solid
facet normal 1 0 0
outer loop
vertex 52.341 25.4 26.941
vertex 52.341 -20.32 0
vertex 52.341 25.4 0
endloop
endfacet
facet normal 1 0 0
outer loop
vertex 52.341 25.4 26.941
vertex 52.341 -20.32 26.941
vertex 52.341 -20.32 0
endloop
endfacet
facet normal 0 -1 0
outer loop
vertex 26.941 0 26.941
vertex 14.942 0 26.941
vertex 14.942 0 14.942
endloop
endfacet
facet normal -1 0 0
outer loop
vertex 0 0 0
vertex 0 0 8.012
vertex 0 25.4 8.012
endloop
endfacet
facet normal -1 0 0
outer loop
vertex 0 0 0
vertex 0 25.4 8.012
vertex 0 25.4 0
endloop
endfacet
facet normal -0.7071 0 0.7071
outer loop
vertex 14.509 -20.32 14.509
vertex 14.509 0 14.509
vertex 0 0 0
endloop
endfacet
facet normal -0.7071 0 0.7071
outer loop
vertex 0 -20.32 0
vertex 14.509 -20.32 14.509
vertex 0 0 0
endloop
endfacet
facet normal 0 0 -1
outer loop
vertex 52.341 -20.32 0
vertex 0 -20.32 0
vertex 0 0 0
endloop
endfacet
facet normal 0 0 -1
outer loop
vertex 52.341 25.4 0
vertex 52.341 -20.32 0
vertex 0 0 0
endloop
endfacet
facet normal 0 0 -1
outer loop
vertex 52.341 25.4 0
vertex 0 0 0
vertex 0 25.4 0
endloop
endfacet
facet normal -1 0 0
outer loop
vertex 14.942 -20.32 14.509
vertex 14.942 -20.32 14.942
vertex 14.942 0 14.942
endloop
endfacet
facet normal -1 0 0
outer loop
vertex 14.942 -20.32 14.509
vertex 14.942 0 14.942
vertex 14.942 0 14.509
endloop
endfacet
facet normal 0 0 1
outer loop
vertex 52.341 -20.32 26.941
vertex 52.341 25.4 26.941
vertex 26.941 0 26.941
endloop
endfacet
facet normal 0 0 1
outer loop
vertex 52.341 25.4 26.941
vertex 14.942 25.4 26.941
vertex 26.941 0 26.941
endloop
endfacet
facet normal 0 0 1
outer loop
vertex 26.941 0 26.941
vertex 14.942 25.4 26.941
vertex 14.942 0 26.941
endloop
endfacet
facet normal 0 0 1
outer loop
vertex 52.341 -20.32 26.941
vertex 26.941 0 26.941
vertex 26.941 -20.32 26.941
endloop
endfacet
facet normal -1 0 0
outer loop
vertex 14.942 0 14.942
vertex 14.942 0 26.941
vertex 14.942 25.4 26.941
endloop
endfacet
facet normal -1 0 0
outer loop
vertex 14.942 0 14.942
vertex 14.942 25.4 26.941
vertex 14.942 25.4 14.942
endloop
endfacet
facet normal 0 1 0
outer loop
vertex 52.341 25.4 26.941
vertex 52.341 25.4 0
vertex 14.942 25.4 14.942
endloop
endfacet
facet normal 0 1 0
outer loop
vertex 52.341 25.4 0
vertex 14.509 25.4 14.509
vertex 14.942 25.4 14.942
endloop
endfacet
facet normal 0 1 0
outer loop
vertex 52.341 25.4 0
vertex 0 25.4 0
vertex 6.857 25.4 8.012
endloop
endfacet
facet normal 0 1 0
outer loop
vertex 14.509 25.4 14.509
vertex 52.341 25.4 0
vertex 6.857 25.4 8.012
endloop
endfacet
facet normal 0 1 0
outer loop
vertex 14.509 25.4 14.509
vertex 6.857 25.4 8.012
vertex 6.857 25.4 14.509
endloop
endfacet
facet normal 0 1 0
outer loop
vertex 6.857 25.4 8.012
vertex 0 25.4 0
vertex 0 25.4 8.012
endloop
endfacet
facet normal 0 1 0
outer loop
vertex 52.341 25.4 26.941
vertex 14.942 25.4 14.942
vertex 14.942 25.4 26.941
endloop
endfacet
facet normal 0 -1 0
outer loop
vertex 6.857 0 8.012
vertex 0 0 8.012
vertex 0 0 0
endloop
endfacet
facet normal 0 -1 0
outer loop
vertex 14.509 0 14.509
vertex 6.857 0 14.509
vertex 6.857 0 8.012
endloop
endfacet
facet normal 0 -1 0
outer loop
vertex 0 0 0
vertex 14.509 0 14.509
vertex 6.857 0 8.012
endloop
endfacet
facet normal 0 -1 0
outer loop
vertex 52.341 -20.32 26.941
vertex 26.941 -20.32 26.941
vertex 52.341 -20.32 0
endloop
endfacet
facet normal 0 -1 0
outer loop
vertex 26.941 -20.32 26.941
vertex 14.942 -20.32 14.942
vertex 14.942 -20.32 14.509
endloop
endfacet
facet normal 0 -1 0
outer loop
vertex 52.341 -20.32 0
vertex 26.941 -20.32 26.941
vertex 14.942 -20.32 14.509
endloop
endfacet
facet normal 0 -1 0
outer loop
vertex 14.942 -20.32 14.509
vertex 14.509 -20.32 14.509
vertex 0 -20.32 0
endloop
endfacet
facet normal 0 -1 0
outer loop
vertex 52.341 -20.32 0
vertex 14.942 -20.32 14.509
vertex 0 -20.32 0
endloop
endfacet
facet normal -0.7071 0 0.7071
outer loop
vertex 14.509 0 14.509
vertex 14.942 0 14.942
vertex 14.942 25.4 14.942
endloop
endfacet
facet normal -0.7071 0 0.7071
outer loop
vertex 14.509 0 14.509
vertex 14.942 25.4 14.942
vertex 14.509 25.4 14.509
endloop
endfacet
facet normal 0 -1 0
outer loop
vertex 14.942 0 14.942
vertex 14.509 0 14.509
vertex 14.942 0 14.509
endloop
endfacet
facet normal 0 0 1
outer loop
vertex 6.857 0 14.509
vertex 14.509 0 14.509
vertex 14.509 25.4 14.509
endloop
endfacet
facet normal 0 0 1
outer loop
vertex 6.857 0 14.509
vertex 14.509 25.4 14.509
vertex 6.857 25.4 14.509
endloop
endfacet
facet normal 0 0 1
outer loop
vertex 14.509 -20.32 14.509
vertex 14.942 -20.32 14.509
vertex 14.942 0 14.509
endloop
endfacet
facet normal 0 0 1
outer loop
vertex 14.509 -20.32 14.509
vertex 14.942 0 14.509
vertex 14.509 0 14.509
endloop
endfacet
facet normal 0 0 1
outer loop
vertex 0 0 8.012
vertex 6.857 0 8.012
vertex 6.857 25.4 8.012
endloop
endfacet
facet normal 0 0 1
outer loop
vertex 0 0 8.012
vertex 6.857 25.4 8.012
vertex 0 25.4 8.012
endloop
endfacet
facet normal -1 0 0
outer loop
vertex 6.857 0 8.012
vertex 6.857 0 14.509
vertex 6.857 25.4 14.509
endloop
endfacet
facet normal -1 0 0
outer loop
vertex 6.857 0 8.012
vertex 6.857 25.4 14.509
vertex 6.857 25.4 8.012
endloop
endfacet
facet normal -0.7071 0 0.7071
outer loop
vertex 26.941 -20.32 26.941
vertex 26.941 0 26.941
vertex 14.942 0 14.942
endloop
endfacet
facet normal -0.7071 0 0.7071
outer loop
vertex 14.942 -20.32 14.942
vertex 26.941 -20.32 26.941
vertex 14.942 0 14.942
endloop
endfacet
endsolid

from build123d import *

# Parameters (mm, degrees)
F1_DEPTH = 20.32
F2_DEPTH = 25.4
F3_DEPTH = 25.4


with BuildPart() as f1:
    # F0 (on Front) → F1 (new body)
    with BuildSketch(Plane.XZ):
        Polygon((14.508714, 14.508714), (0, 0), (26.940768, 0), (26.940768, 26.940768), (14.94181, 14.94181), (14.94181, 14.508714), align=None)
    extrude(amount=F1_DEPTH)

    # F0 (on Front) → F2 (join)
    with BuildSketch(Plane.XZ):
        Polygon((14.508714, 14.508714), (0, 0), (26.940768, 0), (26.940768, 26.940768), (14.94181, 14.94181), (14.94181, 14.508714), align=None)
        Polygon((0, 8.012275), (0, 0), (14.508714, 14.508714), (6.857352, 14.508714), (6.857352, 8.012275), align=None)
        Polygon((14.94181, 14.94181), (14.508714, 14.508714), (14.94181, 14.508714), align=None)
        Polygon((14.94181, 14.94181), (26.940768, 26.940768), (14.94181, 26.940768), align=None)
    extrude(amount=-F2_DEPTH)

    # F2_face (on face) → F3 (join)
    with BuildSketch(Plane(origin=(26.940768, 2.54, 13.470384), x_dir=(0, 1, 0), z_dir=(1, 0, 0))):
        Polygon((-22.86, -13.470384), (22.86, -13.470384), (22.86, 13.470384), (-2.54, 13.470384), (-22.86, 13.470384), align=None)
    extrude(amount=F3_DEPTH)


solid = f1.part
